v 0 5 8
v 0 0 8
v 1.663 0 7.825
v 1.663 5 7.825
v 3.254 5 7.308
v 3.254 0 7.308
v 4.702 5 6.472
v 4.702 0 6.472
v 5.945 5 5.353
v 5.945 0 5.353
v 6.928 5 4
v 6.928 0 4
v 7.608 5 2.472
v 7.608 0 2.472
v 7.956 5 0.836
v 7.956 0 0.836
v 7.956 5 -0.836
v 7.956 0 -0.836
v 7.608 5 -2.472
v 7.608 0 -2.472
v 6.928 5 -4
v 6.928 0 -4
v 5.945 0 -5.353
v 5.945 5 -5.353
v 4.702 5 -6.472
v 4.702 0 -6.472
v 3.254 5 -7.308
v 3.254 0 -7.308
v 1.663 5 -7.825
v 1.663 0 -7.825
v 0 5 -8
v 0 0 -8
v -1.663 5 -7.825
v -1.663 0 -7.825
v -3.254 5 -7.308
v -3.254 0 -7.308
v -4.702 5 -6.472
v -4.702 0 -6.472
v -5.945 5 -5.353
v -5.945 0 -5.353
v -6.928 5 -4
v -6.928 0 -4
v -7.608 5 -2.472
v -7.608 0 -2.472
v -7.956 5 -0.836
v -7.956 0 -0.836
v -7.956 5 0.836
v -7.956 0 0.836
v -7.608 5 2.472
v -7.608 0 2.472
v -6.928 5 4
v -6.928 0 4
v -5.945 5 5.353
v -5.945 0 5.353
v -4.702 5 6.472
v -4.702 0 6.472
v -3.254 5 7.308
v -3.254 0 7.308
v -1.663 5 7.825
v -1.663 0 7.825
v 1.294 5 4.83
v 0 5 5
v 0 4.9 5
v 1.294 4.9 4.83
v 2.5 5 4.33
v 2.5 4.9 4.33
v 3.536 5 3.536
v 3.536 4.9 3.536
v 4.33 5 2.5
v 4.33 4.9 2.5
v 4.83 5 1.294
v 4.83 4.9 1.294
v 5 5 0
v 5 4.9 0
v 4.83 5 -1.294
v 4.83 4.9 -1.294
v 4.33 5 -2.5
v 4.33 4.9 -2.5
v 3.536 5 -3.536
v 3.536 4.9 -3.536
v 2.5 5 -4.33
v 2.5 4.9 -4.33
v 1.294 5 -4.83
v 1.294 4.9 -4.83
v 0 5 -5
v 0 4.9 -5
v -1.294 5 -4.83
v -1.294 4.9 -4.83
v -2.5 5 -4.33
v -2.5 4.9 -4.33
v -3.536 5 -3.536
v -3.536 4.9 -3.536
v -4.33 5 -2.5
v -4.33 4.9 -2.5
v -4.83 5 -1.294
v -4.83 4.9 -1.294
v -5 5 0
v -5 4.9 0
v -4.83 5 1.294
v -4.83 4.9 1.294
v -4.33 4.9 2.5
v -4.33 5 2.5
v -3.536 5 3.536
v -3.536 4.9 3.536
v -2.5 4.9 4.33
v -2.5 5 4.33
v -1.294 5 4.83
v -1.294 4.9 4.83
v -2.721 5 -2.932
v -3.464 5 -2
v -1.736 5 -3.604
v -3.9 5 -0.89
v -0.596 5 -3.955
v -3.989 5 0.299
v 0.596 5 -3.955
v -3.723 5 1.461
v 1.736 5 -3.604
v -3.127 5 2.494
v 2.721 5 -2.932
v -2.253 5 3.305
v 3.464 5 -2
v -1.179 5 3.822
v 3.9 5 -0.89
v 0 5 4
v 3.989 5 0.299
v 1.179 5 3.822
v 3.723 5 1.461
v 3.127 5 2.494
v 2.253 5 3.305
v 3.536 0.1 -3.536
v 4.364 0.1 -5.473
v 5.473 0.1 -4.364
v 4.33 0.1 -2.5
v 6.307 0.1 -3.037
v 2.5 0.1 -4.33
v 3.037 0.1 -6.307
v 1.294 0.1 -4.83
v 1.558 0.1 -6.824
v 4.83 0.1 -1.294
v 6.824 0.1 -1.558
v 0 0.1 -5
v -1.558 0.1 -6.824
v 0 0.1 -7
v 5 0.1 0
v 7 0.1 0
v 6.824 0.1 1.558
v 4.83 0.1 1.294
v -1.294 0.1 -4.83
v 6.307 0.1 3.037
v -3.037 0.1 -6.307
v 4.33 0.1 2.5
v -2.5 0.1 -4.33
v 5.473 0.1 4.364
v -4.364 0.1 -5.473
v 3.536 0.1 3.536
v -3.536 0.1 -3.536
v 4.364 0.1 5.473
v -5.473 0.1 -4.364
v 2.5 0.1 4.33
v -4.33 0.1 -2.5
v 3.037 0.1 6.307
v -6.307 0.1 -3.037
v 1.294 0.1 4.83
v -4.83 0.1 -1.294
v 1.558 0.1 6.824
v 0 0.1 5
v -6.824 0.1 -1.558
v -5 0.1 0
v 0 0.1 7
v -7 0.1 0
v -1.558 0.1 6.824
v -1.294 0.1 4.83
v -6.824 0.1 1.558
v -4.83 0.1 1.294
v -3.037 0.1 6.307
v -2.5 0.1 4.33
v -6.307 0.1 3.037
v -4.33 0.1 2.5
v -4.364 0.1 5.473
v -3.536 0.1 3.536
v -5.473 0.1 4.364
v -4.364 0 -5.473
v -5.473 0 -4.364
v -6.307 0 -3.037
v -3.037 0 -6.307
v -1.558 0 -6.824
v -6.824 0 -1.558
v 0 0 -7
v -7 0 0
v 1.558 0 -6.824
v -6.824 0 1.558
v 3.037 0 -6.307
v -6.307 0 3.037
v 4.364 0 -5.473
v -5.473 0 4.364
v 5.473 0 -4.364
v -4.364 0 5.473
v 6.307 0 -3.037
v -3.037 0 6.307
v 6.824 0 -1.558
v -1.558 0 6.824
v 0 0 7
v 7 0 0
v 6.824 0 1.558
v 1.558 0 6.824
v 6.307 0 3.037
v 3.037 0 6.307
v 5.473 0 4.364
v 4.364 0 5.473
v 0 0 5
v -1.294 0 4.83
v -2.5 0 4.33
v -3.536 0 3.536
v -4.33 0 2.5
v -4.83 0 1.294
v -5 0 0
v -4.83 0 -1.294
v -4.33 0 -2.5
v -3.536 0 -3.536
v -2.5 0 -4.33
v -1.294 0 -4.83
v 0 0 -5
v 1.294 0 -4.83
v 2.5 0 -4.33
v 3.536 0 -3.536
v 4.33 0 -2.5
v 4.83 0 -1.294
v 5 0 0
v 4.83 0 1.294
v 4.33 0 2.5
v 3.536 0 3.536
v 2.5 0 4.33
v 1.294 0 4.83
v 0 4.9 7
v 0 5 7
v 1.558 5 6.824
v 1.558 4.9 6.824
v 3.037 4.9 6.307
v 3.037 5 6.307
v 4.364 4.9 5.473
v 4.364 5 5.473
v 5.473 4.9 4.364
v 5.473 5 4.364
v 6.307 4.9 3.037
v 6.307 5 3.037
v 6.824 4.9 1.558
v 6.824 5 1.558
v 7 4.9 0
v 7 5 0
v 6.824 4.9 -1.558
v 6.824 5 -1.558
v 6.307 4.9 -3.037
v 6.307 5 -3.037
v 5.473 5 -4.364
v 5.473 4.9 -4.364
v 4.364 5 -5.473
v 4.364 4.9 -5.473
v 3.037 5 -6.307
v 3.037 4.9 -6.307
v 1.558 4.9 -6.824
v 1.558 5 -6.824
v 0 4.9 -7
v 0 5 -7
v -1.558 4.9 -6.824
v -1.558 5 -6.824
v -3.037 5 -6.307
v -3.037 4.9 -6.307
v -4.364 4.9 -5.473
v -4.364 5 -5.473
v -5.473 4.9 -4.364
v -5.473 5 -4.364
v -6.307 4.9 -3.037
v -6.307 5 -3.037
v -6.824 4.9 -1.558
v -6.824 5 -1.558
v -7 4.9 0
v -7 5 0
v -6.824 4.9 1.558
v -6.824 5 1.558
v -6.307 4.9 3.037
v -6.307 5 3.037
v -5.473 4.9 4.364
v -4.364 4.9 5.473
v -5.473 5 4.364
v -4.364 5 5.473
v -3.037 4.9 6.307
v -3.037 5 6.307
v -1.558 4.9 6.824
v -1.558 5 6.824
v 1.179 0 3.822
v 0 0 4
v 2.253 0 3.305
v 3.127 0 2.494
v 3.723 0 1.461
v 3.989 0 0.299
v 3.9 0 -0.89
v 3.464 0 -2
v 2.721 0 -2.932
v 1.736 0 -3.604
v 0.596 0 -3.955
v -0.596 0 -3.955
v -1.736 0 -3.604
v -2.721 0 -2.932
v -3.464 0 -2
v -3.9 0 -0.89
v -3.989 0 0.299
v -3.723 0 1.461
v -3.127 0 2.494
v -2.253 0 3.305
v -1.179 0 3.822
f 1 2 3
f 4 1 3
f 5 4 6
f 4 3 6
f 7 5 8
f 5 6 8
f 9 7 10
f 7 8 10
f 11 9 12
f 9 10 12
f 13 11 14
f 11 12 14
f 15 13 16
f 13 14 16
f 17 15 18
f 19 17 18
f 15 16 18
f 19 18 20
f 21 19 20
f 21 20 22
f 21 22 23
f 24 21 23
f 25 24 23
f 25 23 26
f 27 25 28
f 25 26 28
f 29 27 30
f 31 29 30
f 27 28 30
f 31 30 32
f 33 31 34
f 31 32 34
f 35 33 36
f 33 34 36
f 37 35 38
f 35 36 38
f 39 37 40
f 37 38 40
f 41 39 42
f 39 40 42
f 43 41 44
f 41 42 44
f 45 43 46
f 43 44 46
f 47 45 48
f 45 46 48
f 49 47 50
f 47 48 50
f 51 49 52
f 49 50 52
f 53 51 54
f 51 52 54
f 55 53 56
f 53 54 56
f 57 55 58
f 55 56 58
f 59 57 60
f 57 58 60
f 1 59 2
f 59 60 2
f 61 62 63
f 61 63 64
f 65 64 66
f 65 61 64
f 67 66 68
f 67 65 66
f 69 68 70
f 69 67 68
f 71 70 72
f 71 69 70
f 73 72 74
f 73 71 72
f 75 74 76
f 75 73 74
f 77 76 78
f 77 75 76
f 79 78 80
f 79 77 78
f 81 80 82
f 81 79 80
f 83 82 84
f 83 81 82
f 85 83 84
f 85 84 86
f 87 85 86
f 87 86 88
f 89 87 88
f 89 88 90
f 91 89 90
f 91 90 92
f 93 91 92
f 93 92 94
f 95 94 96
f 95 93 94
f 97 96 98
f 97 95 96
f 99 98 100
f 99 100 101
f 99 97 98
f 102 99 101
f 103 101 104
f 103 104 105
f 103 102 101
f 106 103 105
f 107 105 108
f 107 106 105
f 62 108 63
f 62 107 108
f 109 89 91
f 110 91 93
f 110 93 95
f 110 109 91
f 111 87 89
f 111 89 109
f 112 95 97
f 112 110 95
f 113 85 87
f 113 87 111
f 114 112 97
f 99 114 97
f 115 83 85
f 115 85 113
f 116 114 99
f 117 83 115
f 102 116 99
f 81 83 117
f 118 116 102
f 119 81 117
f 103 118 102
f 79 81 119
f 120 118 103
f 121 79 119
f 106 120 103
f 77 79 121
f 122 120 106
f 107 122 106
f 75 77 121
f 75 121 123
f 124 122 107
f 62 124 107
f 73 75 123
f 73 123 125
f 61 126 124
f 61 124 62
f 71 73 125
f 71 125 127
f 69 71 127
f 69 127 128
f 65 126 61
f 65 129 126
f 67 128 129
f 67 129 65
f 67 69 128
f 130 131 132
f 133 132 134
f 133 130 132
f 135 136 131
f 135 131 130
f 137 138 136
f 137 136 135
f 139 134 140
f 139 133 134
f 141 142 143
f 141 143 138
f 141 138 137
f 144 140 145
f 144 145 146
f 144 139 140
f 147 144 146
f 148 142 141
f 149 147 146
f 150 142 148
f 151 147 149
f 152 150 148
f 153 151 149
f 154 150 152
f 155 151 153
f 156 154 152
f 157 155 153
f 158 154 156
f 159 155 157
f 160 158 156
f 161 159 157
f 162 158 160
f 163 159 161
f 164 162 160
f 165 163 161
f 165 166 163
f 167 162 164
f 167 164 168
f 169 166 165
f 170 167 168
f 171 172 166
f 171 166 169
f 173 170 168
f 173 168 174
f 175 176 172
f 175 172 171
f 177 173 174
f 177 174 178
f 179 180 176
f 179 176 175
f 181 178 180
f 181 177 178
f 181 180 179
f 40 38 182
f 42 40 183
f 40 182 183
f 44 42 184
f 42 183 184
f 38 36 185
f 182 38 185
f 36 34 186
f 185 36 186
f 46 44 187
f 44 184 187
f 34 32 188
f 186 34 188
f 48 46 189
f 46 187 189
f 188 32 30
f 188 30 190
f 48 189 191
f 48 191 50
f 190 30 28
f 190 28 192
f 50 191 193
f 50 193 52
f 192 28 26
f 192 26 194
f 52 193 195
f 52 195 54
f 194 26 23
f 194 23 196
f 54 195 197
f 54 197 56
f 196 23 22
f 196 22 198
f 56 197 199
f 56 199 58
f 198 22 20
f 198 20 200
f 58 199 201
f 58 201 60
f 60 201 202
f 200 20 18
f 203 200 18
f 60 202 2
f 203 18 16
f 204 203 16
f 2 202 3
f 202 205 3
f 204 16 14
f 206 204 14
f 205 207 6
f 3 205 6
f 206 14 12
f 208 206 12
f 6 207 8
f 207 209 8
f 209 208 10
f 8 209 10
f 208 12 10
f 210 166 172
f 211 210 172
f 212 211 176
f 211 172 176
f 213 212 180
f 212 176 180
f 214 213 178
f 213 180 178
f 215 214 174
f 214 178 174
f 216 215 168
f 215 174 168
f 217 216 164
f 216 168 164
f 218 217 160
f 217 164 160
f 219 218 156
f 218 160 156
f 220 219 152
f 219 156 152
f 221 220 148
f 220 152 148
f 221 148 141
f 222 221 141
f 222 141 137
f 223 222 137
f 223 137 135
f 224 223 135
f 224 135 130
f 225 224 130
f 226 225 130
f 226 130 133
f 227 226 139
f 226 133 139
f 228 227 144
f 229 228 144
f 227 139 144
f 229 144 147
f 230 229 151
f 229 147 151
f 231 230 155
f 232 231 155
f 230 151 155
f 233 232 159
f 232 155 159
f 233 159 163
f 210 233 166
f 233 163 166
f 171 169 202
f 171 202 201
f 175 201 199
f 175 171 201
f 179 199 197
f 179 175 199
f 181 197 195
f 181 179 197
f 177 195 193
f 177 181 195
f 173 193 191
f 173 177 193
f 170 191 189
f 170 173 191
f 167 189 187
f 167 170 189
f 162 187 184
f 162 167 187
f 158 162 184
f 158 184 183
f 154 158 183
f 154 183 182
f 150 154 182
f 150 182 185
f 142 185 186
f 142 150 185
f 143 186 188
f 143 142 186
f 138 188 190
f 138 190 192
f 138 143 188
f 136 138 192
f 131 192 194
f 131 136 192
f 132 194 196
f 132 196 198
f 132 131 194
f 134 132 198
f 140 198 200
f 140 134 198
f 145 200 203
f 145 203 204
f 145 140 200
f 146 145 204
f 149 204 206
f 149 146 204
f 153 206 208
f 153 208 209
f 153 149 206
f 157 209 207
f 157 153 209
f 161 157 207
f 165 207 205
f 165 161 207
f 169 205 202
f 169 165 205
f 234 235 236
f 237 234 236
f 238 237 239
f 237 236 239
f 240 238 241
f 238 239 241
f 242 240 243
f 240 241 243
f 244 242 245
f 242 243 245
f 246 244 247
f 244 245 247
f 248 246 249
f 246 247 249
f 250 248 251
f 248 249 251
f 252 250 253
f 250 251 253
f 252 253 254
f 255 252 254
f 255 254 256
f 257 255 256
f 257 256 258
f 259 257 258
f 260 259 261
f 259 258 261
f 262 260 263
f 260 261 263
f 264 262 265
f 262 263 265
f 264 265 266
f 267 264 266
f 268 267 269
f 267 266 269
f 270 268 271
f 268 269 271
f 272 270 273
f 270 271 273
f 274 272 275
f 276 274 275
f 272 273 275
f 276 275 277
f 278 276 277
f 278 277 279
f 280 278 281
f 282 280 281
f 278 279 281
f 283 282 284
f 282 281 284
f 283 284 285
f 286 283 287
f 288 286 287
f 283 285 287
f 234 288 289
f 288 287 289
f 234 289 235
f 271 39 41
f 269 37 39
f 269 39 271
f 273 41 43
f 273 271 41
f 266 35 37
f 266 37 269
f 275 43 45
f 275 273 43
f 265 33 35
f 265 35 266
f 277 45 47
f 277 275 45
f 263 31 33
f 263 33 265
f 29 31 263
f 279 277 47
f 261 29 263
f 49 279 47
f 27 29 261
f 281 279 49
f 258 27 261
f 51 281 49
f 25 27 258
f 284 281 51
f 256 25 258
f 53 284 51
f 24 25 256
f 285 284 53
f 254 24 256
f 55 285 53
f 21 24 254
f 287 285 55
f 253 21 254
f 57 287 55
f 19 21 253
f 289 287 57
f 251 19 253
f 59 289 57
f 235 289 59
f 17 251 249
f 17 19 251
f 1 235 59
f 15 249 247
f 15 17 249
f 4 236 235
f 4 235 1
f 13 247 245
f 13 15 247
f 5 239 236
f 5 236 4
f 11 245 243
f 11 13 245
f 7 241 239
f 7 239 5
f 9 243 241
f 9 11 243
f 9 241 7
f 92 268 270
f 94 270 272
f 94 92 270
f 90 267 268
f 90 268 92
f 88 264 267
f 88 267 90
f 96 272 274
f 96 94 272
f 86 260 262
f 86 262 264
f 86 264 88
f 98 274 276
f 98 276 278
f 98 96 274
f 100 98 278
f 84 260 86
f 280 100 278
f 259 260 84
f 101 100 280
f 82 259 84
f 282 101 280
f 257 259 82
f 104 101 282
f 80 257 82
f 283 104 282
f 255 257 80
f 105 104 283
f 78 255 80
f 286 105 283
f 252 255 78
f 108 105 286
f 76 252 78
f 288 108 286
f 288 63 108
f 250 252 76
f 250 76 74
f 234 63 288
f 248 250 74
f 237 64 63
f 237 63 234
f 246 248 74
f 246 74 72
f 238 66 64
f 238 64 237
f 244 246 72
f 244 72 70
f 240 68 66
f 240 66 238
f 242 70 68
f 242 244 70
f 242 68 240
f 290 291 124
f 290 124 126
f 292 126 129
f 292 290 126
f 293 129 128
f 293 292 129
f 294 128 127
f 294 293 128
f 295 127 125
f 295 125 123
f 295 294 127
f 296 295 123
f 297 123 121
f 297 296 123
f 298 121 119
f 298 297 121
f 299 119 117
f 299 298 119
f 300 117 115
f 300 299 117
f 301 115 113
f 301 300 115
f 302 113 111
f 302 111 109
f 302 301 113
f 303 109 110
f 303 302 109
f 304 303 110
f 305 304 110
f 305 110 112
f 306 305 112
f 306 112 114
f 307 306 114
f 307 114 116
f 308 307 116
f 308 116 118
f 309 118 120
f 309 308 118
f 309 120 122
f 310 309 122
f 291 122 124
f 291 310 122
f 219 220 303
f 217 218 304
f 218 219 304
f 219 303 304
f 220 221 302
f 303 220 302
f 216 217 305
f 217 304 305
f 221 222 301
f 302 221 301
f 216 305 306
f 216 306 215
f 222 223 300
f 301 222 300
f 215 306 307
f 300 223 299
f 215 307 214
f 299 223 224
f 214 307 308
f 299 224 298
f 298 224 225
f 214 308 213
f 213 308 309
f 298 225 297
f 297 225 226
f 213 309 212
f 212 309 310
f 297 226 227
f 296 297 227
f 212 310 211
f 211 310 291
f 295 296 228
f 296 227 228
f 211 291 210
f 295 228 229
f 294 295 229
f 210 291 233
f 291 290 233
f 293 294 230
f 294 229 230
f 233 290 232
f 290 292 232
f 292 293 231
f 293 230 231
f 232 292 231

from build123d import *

# Parameters (mm, degrees)
SKETCH1_R      = 8
SKETCH1_R_2    = 4
EXTRUDE1_DEPTH = 5
SKETCH2_R      = 7
SKETCH2_R_2    = 5
EXTRUDE2_DEPTH = 0.1
EXTRUDE3_START = -0.1
SKETCH3_R      = 7
SKETCH3_R_2    = 5
EXTRUDE3_DEPTH = 0.1


with BuildPart() as part:
    # Sketch1 → Extrude1 (new body)
    with BuildSketch(Plane(origin=(0, 0, 0), x_dir=(1, 0, 0), z_dir=(0, 1, 0))):
        Circle(SKETCH1_R)
        Circle(SKETCH1_R_2, mode=Mode.SUBTRACT)
    extrude(amount=EXTRUDE1_DEPTH)

    # Sketch2 → Extrude2 (cut)
    with BuildSketch(Plane(origin=(0, 5, 0), x_dir=(1, 0, 0), z_dir=(0, 1, 0))):
        Circle(SKETCH2_R)
        Circle(SKETCH2_R_2, mode=Mode.SUBTRACT)
    extrude(amount=-EXTRUDE2_DEPTH, mode=Mode.SUBTRACT)

    # Sketch3 → Extrude3 (cut)
    with BuildSketch(Plane.XZ.offset(EXTRUDE3_START)):
        Circle(SKETCH3_R)
        Circle(SKETCH3_R_2, mode=Mode.SUBTRACT)
    extrude(amount=EXTRUDE3_DEPTH, mode=Mode.SUBTRACT)


solid = part.part
